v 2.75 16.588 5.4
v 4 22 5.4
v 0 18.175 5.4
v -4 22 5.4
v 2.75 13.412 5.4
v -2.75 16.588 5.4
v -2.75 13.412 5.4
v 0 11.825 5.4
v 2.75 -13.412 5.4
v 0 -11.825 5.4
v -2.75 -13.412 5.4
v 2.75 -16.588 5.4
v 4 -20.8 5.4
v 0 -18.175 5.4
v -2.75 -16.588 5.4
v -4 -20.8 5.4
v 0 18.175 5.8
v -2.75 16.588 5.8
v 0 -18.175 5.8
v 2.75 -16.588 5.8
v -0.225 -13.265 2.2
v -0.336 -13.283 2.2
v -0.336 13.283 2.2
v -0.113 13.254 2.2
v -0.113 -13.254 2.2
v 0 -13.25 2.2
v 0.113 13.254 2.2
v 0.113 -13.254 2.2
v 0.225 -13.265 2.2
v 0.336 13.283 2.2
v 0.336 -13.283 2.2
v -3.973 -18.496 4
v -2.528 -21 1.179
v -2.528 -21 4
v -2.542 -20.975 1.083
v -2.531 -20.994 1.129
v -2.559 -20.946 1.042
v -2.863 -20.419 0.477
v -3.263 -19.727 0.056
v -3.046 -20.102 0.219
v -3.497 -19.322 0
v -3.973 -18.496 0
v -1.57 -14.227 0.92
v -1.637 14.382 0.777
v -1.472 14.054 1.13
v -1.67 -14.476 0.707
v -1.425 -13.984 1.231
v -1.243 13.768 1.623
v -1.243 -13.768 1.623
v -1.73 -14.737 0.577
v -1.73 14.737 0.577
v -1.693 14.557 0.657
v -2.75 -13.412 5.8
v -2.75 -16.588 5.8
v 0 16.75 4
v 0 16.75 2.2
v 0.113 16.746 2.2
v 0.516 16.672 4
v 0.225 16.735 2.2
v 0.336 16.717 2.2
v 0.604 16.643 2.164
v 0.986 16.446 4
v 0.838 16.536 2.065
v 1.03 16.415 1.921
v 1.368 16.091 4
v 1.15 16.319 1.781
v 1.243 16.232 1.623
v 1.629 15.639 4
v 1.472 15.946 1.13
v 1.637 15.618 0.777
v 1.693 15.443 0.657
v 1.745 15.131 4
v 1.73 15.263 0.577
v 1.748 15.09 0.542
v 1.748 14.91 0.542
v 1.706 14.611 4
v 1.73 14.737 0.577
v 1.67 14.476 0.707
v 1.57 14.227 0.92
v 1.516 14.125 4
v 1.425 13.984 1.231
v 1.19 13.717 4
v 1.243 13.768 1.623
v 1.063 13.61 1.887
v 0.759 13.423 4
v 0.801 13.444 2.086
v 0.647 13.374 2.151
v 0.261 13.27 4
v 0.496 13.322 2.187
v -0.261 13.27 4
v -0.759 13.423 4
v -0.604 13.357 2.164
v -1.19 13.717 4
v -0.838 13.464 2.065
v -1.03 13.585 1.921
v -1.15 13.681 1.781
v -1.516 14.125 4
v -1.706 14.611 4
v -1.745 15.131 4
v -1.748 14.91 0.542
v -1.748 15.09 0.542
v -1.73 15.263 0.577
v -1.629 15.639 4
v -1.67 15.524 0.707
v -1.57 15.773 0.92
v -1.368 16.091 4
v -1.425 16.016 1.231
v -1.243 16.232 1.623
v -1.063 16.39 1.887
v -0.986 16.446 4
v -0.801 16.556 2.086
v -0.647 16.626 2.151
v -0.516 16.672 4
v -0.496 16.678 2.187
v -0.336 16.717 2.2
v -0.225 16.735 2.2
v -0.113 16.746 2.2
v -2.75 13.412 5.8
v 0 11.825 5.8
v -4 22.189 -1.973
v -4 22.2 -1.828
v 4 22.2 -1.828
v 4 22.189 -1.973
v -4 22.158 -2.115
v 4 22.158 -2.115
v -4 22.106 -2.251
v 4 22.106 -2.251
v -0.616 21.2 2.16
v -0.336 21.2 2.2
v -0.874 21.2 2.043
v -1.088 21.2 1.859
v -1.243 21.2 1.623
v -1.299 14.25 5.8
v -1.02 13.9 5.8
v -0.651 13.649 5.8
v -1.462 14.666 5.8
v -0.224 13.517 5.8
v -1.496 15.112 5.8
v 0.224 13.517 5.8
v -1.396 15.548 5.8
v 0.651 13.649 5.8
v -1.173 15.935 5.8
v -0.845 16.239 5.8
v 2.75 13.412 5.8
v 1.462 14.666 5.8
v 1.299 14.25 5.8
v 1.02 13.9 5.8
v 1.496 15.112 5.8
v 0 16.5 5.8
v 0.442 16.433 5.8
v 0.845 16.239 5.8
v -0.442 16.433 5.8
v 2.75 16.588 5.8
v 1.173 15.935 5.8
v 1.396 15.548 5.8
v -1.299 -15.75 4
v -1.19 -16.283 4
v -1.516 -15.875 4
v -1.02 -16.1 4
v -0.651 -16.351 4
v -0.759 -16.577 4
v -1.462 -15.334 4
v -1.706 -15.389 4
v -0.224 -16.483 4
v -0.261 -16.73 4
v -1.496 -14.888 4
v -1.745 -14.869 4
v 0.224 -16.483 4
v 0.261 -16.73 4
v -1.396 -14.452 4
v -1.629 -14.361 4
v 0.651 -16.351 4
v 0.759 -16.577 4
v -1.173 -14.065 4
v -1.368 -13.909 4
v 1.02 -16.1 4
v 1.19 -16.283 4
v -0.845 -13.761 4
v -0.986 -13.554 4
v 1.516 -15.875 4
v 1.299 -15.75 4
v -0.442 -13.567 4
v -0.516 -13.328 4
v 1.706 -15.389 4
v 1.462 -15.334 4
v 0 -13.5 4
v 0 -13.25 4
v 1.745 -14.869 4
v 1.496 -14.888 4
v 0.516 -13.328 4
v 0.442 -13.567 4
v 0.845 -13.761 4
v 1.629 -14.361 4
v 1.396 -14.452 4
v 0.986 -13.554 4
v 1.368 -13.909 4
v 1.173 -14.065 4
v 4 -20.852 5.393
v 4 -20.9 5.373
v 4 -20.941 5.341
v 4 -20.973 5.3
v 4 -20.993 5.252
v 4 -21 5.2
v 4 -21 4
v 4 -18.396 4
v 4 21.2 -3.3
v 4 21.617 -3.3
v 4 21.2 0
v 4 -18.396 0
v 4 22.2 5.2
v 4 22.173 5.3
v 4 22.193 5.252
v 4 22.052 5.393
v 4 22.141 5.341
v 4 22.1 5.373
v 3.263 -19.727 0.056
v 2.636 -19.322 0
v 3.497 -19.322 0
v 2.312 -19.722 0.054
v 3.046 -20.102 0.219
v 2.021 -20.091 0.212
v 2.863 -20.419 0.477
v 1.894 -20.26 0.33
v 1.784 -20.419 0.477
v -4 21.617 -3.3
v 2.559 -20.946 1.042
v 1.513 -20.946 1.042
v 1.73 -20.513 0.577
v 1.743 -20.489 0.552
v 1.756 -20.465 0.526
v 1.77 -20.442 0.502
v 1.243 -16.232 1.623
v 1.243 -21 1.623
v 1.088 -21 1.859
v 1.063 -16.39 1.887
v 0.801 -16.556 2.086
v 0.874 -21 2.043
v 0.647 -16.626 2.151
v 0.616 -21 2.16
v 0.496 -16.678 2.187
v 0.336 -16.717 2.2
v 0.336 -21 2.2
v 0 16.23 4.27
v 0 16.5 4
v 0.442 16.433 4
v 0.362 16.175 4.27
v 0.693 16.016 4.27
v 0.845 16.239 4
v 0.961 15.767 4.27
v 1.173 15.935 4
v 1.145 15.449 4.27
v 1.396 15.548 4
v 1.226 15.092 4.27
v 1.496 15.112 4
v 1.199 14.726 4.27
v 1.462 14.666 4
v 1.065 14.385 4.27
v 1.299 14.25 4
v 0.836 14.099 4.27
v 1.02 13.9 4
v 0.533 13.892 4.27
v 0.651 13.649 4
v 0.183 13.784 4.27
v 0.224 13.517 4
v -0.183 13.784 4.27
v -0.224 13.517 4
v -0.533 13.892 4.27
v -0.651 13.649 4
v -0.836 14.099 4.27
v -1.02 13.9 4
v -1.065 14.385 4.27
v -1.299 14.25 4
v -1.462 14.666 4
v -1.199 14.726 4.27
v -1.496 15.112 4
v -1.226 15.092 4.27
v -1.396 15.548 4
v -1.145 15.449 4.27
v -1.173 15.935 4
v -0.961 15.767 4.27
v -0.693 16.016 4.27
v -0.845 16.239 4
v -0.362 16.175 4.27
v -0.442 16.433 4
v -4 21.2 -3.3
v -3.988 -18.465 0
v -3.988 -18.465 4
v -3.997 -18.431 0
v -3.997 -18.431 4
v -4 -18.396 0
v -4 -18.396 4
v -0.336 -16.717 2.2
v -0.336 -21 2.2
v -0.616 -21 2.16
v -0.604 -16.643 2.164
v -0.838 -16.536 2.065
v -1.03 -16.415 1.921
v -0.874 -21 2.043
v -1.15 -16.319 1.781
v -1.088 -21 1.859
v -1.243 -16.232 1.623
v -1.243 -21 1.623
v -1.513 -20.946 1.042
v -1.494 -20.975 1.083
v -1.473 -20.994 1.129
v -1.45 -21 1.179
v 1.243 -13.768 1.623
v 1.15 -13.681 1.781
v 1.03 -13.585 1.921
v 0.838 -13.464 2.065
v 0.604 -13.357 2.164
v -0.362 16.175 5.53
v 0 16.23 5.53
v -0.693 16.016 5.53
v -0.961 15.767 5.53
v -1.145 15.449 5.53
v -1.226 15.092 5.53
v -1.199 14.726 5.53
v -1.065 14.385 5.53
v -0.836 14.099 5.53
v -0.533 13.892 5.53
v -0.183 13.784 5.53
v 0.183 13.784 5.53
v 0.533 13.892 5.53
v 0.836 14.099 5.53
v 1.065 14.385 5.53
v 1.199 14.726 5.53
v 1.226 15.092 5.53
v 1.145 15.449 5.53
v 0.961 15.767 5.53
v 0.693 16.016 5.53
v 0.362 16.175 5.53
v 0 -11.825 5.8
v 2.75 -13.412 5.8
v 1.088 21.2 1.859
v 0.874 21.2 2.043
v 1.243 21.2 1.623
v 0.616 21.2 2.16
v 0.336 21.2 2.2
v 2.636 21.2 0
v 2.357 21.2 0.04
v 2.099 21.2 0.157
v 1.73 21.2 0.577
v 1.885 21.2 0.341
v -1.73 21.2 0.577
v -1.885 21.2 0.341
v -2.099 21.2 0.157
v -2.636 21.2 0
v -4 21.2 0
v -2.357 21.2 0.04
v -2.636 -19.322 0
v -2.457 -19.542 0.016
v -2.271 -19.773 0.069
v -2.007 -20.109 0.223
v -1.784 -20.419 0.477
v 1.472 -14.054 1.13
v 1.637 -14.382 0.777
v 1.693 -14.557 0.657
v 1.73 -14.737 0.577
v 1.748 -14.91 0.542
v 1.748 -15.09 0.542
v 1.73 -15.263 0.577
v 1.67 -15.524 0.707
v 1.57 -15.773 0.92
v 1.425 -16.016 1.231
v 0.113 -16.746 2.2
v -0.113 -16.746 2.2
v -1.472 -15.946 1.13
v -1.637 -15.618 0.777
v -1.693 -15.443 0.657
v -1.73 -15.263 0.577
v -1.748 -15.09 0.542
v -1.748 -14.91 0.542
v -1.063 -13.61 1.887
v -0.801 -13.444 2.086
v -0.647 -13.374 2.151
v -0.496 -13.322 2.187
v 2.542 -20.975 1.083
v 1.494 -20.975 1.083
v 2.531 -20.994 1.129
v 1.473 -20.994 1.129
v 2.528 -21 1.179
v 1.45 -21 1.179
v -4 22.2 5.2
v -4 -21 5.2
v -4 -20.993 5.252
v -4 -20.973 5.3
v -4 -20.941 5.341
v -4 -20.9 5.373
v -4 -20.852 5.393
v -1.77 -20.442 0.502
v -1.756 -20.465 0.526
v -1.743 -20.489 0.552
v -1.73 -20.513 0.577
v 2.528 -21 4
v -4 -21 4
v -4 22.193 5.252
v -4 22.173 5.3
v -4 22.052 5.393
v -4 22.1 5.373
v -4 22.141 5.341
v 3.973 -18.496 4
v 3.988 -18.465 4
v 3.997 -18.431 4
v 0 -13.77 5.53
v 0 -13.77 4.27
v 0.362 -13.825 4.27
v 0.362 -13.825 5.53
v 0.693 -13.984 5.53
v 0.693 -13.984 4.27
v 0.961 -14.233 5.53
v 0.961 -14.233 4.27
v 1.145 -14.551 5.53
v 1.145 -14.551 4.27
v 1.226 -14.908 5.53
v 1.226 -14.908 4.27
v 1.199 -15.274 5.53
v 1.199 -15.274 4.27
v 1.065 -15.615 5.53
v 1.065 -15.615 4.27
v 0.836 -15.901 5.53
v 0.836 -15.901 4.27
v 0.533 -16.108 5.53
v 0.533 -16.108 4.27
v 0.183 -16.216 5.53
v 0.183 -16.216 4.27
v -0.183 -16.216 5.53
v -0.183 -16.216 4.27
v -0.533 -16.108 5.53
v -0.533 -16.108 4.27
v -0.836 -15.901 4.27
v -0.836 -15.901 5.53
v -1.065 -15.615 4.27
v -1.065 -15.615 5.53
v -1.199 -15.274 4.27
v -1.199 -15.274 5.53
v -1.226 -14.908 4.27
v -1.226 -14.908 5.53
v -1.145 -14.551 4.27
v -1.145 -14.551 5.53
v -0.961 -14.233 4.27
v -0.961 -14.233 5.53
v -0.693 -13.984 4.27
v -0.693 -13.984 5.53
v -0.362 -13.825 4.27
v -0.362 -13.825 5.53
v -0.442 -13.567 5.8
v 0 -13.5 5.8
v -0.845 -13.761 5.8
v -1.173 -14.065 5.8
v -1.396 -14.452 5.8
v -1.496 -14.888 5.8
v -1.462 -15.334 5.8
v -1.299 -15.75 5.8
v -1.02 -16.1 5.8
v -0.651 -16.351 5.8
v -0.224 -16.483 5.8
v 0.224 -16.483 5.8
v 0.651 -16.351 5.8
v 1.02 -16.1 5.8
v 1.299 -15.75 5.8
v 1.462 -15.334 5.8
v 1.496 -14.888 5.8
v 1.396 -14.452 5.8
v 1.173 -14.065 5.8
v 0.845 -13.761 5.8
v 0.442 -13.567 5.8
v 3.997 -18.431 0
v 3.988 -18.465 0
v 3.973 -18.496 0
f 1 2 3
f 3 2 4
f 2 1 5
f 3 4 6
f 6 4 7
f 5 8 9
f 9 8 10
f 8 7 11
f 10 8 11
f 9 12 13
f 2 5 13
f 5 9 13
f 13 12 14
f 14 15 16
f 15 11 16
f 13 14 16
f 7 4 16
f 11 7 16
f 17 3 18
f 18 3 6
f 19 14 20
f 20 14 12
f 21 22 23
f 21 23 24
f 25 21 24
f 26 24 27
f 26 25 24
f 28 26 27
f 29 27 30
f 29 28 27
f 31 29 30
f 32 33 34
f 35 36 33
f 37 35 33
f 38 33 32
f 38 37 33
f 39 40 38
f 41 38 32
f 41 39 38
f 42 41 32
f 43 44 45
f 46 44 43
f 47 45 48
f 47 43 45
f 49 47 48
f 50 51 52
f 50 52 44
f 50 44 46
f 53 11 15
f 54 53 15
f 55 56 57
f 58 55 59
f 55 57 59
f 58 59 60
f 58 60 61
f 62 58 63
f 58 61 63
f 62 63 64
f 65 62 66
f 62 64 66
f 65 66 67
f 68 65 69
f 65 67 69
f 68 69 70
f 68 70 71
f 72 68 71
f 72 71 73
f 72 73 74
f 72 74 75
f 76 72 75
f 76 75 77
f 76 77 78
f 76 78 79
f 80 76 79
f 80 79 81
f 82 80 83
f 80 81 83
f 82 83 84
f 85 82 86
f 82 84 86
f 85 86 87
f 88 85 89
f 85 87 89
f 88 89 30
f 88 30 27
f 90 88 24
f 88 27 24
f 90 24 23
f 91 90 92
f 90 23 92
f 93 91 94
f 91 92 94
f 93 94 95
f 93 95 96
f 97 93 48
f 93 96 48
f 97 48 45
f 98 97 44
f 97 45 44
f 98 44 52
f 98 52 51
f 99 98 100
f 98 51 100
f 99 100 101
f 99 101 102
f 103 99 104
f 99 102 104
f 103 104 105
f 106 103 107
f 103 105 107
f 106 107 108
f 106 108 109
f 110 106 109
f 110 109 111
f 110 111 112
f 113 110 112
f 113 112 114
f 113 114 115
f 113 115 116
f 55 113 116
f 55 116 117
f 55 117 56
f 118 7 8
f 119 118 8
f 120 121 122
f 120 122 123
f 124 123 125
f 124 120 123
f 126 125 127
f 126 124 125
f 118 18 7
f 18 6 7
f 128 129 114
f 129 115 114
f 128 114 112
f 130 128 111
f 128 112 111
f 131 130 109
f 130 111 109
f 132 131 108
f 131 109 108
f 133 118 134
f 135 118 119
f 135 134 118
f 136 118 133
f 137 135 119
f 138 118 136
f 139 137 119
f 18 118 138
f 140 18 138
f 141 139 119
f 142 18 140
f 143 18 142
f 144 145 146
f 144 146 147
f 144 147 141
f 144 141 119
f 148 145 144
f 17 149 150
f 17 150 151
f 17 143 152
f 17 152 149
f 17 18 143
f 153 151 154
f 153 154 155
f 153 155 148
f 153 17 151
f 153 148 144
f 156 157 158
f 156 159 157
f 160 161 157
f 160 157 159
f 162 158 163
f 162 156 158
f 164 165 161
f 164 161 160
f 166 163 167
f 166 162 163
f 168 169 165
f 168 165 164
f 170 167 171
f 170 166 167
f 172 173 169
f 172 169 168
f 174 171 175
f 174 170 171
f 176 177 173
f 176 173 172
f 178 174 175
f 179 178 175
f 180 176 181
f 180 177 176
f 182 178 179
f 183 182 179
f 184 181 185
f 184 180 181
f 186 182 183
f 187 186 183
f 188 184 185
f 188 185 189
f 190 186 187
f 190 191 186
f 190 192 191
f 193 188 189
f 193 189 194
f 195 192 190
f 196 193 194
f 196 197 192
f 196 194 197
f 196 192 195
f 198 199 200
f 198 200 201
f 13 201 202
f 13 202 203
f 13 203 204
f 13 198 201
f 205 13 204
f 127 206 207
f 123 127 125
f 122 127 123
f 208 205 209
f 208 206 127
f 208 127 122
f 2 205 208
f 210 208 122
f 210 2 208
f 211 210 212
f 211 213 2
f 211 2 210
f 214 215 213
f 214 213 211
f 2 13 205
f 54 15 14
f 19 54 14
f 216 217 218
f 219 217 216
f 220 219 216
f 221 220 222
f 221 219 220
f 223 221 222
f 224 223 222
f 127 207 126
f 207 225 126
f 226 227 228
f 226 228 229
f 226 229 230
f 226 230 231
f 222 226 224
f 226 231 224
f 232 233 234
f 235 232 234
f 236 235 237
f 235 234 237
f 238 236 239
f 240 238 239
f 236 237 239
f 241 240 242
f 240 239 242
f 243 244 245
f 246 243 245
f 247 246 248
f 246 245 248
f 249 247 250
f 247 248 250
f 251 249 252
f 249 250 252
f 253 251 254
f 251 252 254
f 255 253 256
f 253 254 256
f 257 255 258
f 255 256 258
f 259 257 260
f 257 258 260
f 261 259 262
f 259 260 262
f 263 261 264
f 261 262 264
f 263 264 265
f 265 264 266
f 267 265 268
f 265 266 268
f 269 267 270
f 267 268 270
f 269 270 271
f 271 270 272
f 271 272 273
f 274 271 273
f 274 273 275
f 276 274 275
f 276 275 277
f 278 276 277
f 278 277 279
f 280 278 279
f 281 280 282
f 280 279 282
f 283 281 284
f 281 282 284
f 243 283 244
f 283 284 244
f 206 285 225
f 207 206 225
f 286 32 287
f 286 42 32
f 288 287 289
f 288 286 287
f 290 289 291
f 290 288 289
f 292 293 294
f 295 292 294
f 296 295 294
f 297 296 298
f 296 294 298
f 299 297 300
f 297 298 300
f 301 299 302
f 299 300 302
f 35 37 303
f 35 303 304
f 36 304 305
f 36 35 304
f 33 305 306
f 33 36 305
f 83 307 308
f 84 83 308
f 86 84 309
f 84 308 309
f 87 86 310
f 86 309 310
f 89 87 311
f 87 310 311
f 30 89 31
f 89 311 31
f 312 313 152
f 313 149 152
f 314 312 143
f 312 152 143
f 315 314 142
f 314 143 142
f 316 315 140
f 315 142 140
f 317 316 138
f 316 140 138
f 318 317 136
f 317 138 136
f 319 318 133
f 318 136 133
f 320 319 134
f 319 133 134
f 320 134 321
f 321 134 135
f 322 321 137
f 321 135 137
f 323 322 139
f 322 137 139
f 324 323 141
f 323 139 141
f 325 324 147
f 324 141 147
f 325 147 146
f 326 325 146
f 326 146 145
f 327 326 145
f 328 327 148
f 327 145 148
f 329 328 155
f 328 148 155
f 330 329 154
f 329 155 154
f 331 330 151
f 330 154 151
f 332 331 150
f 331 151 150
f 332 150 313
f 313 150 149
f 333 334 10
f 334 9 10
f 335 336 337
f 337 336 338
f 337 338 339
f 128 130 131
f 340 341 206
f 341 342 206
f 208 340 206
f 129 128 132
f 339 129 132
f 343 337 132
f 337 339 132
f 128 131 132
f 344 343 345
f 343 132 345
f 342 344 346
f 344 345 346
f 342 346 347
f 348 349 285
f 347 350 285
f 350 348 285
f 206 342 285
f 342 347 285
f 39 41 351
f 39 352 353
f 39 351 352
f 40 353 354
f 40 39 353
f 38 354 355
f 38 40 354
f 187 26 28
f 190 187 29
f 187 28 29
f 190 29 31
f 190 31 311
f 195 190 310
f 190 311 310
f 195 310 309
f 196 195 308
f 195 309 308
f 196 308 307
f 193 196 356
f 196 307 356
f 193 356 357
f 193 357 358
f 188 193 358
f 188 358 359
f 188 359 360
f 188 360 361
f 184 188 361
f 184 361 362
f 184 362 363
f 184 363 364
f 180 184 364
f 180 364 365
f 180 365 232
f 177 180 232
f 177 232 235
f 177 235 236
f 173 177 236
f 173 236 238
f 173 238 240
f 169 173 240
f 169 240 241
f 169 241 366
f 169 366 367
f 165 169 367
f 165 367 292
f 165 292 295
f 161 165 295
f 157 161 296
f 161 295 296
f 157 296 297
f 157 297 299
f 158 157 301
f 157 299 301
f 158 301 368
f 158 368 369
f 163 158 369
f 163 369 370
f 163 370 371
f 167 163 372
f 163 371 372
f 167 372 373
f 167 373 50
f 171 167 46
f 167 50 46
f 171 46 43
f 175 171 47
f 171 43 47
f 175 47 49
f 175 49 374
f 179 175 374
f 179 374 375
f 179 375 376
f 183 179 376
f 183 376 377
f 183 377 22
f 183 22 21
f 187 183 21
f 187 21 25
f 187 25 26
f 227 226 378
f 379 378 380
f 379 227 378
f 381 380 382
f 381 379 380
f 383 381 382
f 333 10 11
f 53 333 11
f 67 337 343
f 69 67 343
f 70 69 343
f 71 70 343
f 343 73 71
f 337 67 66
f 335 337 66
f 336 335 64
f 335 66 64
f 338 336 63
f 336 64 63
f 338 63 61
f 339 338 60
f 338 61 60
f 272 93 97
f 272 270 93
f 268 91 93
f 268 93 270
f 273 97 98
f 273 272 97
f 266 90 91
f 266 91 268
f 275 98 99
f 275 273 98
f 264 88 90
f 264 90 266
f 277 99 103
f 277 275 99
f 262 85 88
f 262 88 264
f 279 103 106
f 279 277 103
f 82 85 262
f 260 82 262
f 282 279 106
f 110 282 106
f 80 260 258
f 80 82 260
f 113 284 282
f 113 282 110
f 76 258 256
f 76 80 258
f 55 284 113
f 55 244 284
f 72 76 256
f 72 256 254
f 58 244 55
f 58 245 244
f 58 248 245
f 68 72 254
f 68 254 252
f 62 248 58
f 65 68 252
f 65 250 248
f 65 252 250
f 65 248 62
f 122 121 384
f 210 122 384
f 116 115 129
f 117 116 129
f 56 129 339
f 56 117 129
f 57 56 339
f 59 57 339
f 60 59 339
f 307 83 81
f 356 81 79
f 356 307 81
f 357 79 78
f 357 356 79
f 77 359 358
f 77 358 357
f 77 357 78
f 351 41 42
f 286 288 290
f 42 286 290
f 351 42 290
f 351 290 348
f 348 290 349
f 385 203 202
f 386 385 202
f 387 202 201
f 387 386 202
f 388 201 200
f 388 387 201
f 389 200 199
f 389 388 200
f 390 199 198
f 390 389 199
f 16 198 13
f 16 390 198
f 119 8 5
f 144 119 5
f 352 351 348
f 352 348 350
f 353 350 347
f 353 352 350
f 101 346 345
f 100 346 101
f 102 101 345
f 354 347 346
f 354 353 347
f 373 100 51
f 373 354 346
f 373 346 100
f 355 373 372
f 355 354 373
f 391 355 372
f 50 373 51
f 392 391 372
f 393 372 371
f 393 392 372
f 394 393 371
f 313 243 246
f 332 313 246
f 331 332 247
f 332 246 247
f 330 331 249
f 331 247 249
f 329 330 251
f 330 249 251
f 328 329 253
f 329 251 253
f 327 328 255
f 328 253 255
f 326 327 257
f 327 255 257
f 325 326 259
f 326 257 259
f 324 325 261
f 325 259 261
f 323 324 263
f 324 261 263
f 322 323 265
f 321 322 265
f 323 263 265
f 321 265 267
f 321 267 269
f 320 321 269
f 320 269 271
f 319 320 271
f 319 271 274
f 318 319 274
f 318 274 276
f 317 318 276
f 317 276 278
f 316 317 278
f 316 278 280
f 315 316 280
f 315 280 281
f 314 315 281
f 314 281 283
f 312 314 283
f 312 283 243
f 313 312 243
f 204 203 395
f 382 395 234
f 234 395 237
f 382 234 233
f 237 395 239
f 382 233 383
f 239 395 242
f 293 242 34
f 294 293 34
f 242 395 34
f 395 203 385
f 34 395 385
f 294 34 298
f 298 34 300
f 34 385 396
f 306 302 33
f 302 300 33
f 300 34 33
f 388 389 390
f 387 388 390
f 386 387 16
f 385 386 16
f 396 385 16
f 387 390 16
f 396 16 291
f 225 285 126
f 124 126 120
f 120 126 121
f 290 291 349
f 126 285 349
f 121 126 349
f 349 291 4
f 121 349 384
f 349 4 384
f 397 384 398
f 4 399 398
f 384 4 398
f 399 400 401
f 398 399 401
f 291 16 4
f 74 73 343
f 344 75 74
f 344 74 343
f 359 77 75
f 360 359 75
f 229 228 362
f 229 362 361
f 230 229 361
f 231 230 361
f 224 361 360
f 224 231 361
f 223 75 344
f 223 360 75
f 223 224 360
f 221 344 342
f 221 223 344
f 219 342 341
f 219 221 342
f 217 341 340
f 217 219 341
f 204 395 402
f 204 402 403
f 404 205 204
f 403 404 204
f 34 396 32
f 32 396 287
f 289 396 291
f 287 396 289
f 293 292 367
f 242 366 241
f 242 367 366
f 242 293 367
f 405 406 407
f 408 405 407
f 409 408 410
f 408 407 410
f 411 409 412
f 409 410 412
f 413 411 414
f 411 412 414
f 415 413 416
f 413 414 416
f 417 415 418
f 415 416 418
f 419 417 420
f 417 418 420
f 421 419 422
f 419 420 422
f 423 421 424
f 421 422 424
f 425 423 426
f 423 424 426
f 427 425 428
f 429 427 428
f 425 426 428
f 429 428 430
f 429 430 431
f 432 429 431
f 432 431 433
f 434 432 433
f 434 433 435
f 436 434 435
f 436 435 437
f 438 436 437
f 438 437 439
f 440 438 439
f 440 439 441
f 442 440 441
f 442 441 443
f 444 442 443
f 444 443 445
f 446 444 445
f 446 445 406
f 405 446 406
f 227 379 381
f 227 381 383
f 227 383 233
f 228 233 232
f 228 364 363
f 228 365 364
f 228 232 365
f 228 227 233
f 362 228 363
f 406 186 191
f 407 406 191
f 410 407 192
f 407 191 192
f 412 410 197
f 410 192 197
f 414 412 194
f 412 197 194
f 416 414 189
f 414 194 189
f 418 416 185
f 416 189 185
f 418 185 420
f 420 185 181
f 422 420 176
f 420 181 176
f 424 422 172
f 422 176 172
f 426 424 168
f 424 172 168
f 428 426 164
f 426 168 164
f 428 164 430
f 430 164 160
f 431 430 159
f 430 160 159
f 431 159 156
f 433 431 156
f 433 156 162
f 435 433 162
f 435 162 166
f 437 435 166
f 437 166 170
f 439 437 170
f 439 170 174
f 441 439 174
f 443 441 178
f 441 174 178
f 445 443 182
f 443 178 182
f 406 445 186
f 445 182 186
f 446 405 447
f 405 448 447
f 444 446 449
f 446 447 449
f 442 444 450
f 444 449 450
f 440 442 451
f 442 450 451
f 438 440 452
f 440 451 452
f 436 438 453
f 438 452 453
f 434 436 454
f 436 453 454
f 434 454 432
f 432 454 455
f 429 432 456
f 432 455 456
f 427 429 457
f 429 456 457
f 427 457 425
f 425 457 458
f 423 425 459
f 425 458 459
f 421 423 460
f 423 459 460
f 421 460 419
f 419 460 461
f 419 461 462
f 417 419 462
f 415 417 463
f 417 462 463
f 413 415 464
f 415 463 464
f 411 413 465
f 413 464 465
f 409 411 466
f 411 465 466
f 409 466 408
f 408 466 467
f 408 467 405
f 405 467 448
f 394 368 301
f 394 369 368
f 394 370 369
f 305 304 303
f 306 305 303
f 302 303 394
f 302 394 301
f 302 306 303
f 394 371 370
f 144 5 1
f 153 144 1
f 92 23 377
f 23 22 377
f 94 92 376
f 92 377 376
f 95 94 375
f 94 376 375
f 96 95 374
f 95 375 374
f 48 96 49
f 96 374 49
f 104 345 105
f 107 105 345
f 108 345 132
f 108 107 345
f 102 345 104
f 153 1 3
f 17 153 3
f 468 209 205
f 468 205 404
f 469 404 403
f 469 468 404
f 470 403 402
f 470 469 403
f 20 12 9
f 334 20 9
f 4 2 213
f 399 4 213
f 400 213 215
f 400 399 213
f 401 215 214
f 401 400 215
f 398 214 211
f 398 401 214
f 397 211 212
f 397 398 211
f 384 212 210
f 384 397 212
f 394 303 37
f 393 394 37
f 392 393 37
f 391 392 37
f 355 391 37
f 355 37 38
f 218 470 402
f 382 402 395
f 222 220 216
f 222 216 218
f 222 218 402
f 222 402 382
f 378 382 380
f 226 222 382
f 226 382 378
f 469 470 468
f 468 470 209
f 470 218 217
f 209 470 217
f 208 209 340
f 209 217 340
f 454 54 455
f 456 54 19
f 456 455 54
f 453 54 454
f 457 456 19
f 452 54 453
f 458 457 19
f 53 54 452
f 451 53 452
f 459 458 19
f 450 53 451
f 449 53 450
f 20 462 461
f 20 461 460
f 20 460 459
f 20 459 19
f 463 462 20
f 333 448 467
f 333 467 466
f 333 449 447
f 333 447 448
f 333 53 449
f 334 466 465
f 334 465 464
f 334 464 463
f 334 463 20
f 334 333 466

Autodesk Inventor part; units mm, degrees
sketch "Sketch_1" plane through (0, 0, 0) normal (1, 0, 0) x (0, 1, 0)
  line L0 (22, 5.4) -> (-20.8, 5.4)
  arc A0 (-20.8, 5.4) -> (-21, 5.2) centre (-20.8, 5.2) ccw
  line L1 (-21, 5.2) -> (-21, 1.1788)
  arc A1 (-21, 1.1788) -> (-20.9463, 1.0424) centre (-20.8, 1.1788) ccw
  line L2 (-20.9463, 1.0424) -> (-20.419, 0.477)
  arc A2 (-20.419, 0.477) -> (-19.322, 0) centre (-19.322, 1.5) ccw
  line L3 (-19.322, 0) -> (21.2, 0)
  line L4 (21.2, 0) -> (21.2, -3.3)
  line L5 (21.2, -3.3) -> (21.6171, -3.3)
  line L6 (21.6171, -3.3) -> (22.1063, -2.2509)
  arc A3 (22.1063, -2.2509) -> (22.2, -1.8283) centre (21.2, -1.8283) ccw
  line L7 (22.2, -1.8283) -> (22.2, 5.2)
  arc A4 (22.2, 5.2) -> (22, 5.4) centre (22, 5.2) ccw
extrude "Extrusion1" add sketch "Sketch_1" along normal mid plane 8
sketch "Sketch_6" plane through (0, -21.6, 0) normal (0, 1, 0) x (1, 0, 0)
  arc A0 (-1.7301, -0.5774) -> (-2.6364, 0) centre (-2.6364, -1) ccw
  line L0 (-1.7301, -0.5774) -> (-1.2427, -1.6226)
  arc A1 (-1.2427, -1.6226) -> (-0.3364, -2.2) centre (-0.3364, -1.2) ccw
  line L1 (-0.3364, -2.2) -> (0.3364, -2.2)
  arc A2 (0.3364, -2.2) -> (1.2427, -1.6226) centre (0.3364, -1.2) ccw
  line L2 (1.2427, -1.6226) -> (1.7301, -0.5774)
  arc A3 (2.6364, 0) -> (1.7301, -0.5774) centre (2.6364, -1) ccw
  line L3 (2.6364, 0) -> (-2.6364, 0)
extrude "Extrusion2" cut sketch "Sketch_6" along normal blind 42.8
sketch "Sketch_9" plane through (0, 0, 0) normal (0, 0, 1) x (1, 0, 0)
  line L0 (-5, -18.3964) -> (-5, -23.2)
  line L1 (-5, -23.2) -> (5, -23.2)
  line L2 (5, -23.2) -> (5, -18.3964)
  line L3 (5, -18.3964) -> (4, -18.3964)
  arc A0 (3.9732, -18.4964) -> (4, -18.3964) centre (3.8, -18.3964) ccw
  line L4 (3.9732, -18.4964) -> (1.8927, -22.1)
  arc A1 (1.7195, -22.2) -> (1.8927, -22.1) centre (1.7195, -22) ccw
  line L5 (1.7195, -22.2) -> (-1.7195, -22.2)
  arc A2 (-1.8927, -22.1) -> (-1.7195, -22.2) centre (-1.7195, -22) ccw
  line L6 (-1.8927, -22.1) -> (-3.9732, -18.4964)
  arc A3 (-4, -18.3964) -> (-3.9732, -18.4964) centre (-3.8, -18.3964) ccw
  line L7 (-4, -18.3964) -> (-5, -18.3964)
extrude "Extrusion3" cut sketch "Sketch_9" along normal blind 4
sketch "Sketch_11" plane through (0, 0, 5.4) normal (0, 0, 1) x (1, 0, 0)
  line L0 (-2.75, 13.4123) -> (0, 11.8246)
  line L1 (0, 11.8246) -> (2.75, 13.4123)
  line L2 (2.75, 13.4123) -> (2.75, 16.5877)
  line L3 (2.75, 16.5877) -> (0, 18.1754)
  line L4 (0, 18.1754) -> (-2.75, 16.5877)
  line L5 (-2.75, 16.5877) -> (-2.75, 13.4123)
sketch "Sketch_12" plane through (0, 0, 5.4) normal (0, 0, 1) x (1, 0, 0)
  line L0 (-2.75, -16.5877) -> (0, -18.1754)
  line L1 (0, -18.1754) -> (2.75, -16.5877)
  line L2 (2.75, -16.5877) -> (2.75, -13.4123)
  line L3 (2.75, -13.4123) -> (0, -11.8246)
  line L4 (0, -11.8246) -> (-2.75, -13.4123)
  line L5 (-2.75, -13.4123) -> (-2.75, -16.5877)
extrude "Extrusion4" add sketch "Sketch_12" along normal blind 0.4
extrude "Extrusion5" add sketch "Sketch_11" along normal blind 0.4
sketch "Sketch_10" plane through (0, 0, 0) normal (1, 0, 0) x (0, 1, 0)
  line L0 (15, 0) -> (15, 5.8)
  line L1 (15, 5.8) -> (16.5, 5.8)
  line L2 (16.5, 5.8) -> (16.2295, 5.5295)
  line L3 (16.2295, 5.5295) -> (16.2295, 4.2705)
  line L4 (16.2295, 4.2705) -> (16.5, 4)
  line L5 (16.5, 4) -> (16.75, 4)
  line L6 (16.75, 4) -> (16.75, 0)
  line L7 (16.75, 0) -> (15, 0)
  line L8 (15, 0) -> (15, 5.8)
revolve "Revolution1" cut sketch "Sketch_10" angle 360 about axis through (0, 15, 0) along (0, 0, -1)
thread "Thread1" size "M3x0.5" class "6H" standard "ISO Metric profile" full length
sketch "Sketch_13" plane through (0, 0, 0) normal (1, 0, 0) x (0, 1, 0)
  line L0 (-15, 0) -> (-15, 5.8)
  line L1 (-15, 5.8) -> (-13.5, 5.8)
  line L2 (-13.5, 5.8) -> (-13.7705, 5.5295)
  line L3 (-13.7705, 5.5295) -> (-13.7705, 4.2705)
  line L4 (-13.7705, 4.2705) -> (-13.5, 4)
  line L5 (-13.5, 4) -> (-13.25, 4)
  line L6 (-13.25, 4) -> (-13.25, 0)
  line L7 (-13.25, 0) -> (-15, 0)
  line L8 (-15, 0) -> (-15, 5.8)
revolve "Revolution2" cut sketch "Sketch_13" angle 360 about axis through (0, -15, 0) along (0, 0, -1)
thread "Thread2" size "M3x0.5" class "6H" standard "ISO Metric profile" full length
ref_plane "ANBAU_XY" through (0, 0, -15.2) normal (0, -1, 0) x (1, 0, 0)
ref_plane "ANBAU_YZ" through (0, 0, -15.2) normal (1, 0, 0) x (0, 0, 1)
ref_plane "ANBAU_ZX" through (0, 0, -15.2) normal (0, 0, 1) x (0, -1, 0)
ref_plane "ANBAU_2_XY" through (0, 0, -15.2) normal (1, 0, 0) x (0, 0, -1)
ref_plane "ANBAU_2_YZ" through (0, 0, -15.2) normal (0, 0, -1) x (0, 1, 0)
ref_plane "ANBAU_2_ZX" through (0, 0, -15.2) normal (0, 1, 0) x (1, 0, 0)
ref_plane "IP1_XY" through (0, 0, 5.4) normal (0, 0, -1) x (1, 0, 0)
ref_plane "IP1_YZ" through (0, 0, 5.4) normal (1, 0, 0) x (0, -1, 0)
ref_plane "IP1_ZX" through (0, 0, 5.4) normal (0, -1, 0) x (0, 0, -1)
ref_plane "IP_ANBAU_XY" through (0, 0, 0) normal (0, 0, -1) x (1, 0, 0)
ref_plane "IP_ANBAU_YZ" through (0, 0, 0) normal (1, 0, 0) x (0, -1, 0)
ref_plane "IP_ANBAU_ZX" through (0, 0, 0) normal (0, -1, 0) x (0, 0, -1)
ref_plane "IP_ANBAU_2_XY" through (0, 0, -15.2) normal (1, 0, 0) x (0, 0, -1)
ref_plane "IP_ANBAU_2_YZ" through (0, 0, -15.2) normal (0, 0, -1) x (0, 1, 0)
ref_plane "IP_ANBAU_2_ZX" through (0, 0, -15.2) normal (0, 1, 0) x (1, 0, 0)
properties part number "8116179 MS4-MV-B---(0_high_m)"
